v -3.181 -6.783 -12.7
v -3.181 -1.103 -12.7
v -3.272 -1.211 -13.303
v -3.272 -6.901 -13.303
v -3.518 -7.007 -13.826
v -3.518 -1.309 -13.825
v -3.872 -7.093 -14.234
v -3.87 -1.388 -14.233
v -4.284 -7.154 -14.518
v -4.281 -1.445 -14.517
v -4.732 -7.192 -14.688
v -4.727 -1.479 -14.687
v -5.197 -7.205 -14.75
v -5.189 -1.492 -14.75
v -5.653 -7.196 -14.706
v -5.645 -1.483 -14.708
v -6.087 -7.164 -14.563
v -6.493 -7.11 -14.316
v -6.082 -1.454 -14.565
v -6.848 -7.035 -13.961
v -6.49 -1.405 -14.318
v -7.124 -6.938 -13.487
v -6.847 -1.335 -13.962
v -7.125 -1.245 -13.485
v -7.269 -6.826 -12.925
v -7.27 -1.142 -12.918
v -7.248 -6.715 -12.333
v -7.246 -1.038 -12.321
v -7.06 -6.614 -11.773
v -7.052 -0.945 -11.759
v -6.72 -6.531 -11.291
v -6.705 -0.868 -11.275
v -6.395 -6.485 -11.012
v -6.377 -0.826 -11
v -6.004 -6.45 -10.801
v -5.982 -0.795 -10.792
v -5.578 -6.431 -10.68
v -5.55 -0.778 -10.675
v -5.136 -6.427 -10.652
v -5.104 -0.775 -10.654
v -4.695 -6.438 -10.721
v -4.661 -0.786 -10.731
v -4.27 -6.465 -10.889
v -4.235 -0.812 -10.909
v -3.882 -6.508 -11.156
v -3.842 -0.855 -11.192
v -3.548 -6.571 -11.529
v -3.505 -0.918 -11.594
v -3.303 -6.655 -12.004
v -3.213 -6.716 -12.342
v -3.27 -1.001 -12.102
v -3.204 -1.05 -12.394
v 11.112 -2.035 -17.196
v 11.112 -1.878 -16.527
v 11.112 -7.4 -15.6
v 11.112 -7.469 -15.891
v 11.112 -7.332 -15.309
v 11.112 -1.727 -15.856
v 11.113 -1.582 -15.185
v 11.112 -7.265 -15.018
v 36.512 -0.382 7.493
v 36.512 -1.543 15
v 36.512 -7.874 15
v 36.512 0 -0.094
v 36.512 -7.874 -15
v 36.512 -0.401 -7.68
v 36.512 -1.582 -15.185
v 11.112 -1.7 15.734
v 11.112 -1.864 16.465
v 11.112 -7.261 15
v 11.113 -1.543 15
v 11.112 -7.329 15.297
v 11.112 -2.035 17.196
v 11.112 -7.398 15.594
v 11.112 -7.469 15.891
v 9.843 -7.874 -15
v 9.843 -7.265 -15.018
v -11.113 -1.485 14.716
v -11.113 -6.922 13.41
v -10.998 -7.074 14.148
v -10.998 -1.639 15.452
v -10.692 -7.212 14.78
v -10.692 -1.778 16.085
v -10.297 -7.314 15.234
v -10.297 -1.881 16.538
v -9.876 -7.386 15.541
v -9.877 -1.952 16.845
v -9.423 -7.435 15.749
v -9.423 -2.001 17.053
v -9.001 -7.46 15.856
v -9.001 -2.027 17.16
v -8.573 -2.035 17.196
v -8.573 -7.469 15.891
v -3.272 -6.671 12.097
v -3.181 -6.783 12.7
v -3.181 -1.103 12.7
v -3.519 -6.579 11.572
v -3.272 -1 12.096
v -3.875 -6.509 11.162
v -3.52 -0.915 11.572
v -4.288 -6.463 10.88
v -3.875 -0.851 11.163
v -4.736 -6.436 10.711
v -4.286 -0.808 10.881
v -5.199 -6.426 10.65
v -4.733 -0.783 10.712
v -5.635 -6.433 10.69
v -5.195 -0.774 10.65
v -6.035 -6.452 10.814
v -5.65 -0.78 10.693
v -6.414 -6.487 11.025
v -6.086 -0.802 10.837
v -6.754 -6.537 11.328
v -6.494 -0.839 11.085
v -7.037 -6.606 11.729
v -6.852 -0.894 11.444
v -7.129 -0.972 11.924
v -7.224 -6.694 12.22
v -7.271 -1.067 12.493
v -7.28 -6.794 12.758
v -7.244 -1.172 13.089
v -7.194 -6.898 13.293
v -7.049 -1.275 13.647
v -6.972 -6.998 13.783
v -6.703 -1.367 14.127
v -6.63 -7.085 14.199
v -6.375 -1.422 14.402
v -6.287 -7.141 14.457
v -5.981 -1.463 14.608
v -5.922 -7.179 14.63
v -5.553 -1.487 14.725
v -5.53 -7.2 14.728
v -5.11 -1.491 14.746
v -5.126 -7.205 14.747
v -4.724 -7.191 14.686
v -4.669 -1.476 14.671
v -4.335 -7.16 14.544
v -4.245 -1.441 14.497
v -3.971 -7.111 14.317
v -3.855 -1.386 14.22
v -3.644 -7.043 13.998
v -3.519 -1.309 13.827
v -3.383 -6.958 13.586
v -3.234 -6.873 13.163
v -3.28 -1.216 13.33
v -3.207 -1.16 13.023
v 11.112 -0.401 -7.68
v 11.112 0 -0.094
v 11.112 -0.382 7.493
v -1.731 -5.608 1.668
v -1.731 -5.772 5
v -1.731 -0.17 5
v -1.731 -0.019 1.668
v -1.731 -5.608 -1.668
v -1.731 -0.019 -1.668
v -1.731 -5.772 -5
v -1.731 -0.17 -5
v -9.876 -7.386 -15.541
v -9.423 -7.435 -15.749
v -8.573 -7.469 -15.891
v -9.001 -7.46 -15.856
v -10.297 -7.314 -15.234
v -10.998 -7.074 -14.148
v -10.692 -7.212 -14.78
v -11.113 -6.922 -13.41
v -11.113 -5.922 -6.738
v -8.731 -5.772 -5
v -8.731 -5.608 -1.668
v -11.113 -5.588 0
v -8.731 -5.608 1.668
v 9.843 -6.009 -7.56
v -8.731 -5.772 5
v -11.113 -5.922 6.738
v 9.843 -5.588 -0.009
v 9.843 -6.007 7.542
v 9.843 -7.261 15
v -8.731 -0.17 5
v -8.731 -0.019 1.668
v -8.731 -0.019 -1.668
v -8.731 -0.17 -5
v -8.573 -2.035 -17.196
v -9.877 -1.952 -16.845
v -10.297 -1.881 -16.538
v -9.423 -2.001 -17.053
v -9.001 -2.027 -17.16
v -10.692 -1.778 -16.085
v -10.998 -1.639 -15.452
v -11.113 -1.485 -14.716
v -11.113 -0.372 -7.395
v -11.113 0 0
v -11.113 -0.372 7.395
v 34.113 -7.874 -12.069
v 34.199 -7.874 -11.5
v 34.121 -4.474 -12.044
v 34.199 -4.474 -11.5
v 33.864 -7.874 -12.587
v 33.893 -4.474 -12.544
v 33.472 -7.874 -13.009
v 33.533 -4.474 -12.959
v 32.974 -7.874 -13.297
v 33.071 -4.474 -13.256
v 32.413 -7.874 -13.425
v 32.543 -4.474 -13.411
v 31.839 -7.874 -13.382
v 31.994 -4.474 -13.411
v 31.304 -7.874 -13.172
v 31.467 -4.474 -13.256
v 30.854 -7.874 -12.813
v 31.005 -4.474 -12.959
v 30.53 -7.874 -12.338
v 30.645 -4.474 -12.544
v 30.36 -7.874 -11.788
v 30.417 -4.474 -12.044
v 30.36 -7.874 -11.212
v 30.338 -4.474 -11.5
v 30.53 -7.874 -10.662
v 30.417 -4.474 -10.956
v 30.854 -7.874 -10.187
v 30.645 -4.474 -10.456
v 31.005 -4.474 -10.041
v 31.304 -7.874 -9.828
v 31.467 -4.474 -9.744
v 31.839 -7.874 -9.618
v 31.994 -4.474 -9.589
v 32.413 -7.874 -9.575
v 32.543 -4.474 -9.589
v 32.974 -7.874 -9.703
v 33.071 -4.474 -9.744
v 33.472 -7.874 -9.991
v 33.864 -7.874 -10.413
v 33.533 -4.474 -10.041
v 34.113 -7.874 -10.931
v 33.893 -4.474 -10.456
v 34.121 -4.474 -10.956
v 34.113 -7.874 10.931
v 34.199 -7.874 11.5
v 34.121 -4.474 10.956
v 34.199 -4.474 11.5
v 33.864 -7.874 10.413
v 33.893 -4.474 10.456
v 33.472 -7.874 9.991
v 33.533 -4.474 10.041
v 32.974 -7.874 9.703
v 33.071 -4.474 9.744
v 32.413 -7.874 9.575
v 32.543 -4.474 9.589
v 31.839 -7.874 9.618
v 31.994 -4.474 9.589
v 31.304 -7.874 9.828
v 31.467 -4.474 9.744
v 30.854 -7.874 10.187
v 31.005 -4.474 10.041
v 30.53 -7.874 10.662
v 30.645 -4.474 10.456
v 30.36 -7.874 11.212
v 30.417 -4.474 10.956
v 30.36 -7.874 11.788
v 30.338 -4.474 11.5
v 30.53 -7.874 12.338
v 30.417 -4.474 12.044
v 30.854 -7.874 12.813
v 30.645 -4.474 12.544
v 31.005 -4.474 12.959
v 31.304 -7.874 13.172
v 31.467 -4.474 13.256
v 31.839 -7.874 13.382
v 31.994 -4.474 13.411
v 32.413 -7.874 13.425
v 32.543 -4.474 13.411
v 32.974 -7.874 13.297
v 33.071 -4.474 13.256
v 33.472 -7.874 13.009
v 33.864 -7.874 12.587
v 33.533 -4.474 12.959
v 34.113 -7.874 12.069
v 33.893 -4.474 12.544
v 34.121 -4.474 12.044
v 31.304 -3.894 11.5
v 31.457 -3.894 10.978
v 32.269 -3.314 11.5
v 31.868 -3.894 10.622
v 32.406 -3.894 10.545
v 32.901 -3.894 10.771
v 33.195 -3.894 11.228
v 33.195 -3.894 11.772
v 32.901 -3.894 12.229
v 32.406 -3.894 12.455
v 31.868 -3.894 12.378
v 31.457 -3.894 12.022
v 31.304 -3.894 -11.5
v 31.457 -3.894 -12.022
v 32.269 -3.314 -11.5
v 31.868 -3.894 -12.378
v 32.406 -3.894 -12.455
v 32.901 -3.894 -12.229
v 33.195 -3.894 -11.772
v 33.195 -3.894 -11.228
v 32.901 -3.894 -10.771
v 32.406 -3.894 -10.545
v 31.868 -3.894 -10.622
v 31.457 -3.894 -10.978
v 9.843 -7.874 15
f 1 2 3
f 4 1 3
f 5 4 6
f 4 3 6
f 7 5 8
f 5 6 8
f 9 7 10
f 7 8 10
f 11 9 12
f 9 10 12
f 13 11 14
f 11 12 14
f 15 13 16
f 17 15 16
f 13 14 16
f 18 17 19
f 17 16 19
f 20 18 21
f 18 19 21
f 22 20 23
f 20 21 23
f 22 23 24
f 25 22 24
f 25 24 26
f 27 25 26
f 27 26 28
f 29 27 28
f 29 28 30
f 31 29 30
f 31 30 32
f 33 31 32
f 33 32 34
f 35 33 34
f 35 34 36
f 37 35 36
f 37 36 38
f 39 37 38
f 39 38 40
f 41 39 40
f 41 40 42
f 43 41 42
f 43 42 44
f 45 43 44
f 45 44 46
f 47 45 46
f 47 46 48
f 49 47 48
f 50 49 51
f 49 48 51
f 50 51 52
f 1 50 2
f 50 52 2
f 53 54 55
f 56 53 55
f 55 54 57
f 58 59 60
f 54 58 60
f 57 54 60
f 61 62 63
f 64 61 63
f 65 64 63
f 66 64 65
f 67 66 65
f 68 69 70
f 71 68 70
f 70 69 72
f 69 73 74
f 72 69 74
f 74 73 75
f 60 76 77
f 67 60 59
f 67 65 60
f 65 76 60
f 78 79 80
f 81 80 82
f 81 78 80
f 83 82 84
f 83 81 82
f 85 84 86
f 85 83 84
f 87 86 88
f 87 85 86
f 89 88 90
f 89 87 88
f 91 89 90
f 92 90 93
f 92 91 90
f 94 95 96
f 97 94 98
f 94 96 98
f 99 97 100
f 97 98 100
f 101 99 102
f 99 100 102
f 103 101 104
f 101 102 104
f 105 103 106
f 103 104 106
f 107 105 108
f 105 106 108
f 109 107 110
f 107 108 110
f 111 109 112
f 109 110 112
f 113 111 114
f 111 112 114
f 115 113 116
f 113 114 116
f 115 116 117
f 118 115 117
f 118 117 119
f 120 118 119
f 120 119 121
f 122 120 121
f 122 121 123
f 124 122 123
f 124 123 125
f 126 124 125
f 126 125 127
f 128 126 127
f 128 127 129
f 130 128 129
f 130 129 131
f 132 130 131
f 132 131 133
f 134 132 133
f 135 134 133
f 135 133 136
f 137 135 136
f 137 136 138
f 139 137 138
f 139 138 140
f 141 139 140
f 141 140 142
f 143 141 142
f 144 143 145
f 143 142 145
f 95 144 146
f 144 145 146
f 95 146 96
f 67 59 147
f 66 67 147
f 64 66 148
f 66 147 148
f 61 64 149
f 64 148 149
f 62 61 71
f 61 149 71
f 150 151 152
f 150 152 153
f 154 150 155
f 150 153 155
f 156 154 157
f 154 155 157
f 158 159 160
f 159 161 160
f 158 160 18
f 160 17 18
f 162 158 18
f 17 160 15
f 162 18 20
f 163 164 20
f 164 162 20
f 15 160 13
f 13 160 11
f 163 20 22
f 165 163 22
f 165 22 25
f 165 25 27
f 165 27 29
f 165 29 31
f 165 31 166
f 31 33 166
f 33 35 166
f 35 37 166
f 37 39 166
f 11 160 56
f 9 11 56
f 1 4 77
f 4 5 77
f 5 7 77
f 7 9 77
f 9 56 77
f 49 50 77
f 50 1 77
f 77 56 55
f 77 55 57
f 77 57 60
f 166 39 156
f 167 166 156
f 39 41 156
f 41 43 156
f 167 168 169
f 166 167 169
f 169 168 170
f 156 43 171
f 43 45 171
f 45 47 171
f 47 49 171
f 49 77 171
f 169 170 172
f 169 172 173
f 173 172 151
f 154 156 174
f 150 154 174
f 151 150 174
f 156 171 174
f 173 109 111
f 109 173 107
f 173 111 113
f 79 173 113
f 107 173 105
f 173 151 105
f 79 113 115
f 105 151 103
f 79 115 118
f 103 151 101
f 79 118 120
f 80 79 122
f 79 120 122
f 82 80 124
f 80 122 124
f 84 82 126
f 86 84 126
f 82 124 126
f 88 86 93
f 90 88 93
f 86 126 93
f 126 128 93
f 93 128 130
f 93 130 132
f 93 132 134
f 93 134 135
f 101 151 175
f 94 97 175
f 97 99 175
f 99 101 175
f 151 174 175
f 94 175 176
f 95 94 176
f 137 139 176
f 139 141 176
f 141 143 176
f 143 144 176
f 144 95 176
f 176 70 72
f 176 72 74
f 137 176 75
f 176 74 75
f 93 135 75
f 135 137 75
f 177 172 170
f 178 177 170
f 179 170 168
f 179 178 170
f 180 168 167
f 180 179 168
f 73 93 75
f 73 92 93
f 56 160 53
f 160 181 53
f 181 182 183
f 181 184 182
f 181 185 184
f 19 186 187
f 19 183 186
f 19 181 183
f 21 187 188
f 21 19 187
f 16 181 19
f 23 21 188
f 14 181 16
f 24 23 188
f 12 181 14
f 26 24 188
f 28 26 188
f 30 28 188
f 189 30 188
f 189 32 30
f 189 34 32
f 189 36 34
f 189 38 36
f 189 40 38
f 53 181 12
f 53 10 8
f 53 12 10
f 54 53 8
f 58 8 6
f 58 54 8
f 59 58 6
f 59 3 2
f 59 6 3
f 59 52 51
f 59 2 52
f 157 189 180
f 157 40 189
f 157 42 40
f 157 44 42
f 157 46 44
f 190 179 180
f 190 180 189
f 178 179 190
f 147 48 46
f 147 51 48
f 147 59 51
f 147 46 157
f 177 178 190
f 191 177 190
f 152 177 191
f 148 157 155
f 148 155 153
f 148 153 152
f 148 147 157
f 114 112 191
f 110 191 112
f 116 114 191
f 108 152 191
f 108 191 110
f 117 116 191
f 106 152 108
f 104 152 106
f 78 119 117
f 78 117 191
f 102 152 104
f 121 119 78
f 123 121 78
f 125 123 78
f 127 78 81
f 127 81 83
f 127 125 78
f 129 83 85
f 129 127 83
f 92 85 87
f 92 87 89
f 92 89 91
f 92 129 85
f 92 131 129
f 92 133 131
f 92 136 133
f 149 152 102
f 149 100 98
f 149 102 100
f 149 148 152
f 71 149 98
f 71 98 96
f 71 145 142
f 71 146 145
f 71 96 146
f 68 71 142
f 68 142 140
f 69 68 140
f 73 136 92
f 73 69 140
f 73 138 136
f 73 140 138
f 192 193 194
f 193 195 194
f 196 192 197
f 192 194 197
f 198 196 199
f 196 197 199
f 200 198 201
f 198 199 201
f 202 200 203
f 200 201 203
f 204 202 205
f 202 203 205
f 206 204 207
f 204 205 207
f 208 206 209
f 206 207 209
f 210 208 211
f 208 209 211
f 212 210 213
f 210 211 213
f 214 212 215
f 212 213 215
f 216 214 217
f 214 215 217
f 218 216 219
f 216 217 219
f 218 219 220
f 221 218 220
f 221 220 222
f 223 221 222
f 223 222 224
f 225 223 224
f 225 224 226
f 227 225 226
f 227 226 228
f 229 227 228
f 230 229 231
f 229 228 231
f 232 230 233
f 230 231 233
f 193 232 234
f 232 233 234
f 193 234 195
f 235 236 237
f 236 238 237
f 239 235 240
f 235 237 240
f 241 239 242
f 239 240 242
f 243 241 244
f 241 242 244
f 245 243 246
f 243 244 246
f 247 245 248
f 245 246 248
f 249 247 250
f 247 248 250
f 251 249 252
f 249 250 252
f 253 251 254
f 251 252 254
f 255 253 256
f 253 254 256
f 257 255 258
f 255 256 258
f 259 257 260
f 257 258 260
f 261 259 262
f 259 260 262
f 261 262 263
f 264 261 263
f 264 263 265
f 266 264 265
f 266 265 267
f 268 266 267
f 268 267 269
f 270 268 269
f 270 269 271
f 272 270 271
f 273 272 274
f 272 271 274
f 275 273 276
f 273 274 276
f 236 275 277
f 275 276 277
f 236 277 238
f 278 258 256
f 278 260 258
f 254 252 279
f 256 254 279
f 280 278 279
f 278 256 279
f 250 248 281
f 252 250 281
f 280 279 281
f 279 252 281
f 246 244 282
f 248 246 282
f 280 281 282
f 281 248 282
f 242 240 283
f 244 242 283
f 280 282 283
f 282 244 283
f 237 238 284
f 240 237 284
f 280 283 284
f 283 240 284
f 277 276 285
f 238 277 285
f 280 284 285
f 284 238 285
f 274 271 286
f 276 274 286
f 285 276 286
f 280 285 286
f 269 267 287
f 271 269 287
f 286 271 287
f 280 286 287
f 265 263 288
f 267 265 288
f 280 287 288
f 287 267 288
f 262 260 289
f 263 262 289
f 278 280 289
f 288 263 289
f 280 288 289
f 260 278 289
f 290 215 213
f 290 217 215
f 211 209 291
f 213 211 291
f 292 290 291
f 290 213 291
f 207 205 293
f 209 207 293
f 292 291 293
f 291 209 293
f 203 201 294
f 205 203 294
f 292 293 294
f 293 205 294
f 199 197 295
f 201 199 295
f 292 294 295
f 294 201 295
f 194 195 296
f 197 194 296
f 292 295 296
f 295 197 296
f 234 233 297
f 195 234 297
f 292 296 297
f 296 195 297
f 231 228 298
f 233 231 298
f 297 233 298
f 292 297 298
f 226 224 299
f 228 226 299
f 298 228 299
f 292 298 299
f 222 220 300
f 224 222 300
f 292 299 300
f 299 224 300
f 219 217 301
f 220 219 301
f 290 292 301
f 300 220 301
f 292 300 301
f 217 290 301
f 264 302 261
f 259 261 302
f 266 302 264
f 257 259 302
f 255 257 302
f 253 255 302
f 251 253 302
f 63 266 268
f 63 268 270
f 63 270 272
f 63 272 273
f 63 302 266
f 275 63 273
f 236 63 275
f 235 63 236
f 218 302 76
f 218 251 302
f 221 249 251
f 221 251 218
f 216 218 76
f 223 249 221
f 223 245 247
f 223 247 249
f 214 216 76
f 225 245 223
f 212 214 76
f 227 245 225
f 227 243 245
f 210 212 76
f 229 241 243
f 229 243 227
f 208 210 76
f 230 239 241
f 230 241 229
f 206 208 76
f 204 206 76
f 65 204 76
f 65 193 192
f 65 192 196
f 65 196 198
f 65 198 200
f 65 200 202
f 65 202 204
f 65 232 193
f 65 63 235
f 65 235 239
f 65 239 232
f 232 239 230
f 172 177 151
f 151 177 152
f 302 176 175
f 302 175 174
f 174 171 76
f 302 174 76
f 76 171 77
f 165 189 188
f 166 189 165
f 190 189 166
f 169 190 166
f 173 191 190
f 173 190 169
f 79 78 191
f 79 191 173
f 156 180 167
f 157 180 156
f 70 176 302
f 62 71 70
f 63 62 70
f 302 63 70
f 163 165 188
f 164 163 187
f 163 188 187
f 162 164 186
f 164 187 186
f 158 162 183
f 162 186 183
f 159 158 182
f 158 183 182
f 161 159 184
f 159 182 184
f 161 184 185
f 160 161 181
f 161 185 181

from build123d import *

# Parameters (mm, degrees)
SKETCH1_W                       = 22.225
SKETCH1_H                       = 5.588
REVOLVE1_ANGLE                  = 27
SKETCH2_W                       = 6.99999997
SKETCH2_H                       = 10.000000066
SKETCH2_R                       = 2.049999964
CUT_EXTRUDE1_DEPTH              = 22.793561204
FILLET2_R                       = 2.54
BOSS_EXTRUDE2_DEPTH             = 25.4
BOSS_EXTRUDE2_DEPTH_BACK        = 1.27
F_24_0_152_DIAMETER_HOLE1_D     = 3.8608
F_24_0_152_DIAMETER_HOLE1_DEPTH = 3.3999932
F_24_0_152_DIAMETER_HOLE1_TIP   = 1.159901339


with BuildPart() as part:
    # Sketch1 → Revolve1 (revolve, symmetric)
    with BuildSketch(Plane.XY) as revolve1_sk:
        with Locations((0, -2.794)):
            Rectangle(SKETCH1_W, SKETCH1_H)
    revolve(axis=Axis((21.580970856, -73.66, 0), (-1, 0, 0)), revolution_arc=REVOLVE1_ANGLE / 2)
    revolve(revolve1_sk.sketch, axis=Axis((21.580970856, -73.66, 0), (1, 0, 0)), revolution_arc=REVOLVE1_ANGLE / 2)

    # Sketch2 → Cut-Extrude1 (cut, through all)
    with BuildSketch(Plane(origin=(0, 0, 0), x_dir=(1, 0, 0), z_dir=(0, 1, 0))):
        with Locations((-5.231250015, 0)):
            Rectangle(SKETCH2_W, SKETCH2_H)
        with Locations((-5.231250015, 12.7)):
            Circle(SKETCH2_R)
        with Locations((-5.231250015, -12.7)):
            Circle(SKETCH2_R)
    extrude(amount=-CUT_EXTRUDE1_DEPTH, mode=Mode.SUBTRACT)

    # Fillet2
    fillet2_edges = [part.edges().sort_by_distance(p)[0] for p in [
        (-11.1125, -4.752033221, -16.543339155),
        (-11.1125, -4.752033221, 16.543339155),
    ]]
    fillet(fillet2_edges, radius=FILLET2_R)

    # Sketch8 → Boss-Extrude2 (add, two sides: drawn at the far end of the back side and taken through both)
    with BuildSketch(Plane(origin=(11.1125, 0, 0), x_dir=(0, 0, -1), z_dir=(1, 0, 0)).offset(-BOSS_EXTRUDE2_DEPTH_BACK)):
        with BuildLine():
            Line((-15, -7.874), (15, -7.874))
            Line((15, -7.874), (15.184616566, -1.5821045))
            ThreePointArc((15.184616566, -1.5821045), (0.094309083, -6.0373e-05), (-15, -1.543458208))
            Line((-15, -1.543458208), (-15, -7.874))
        make_face()
    extrude(amount=BOSS_EXTRUDE2_DEPTH + BOSS_EXTRUDE2_DEPTH_BACK)

    # #24 (0.152) Diameter Hole1
    with Locations(Plane(origin=(0, -7.874, 0), x_dir=(-1, 0, 0), z_dir=(0, -1, 0))):
        with Locations((-32.26874997, 11.5), (-32.26874997, -11.5)):
            Hole(F_24_0_152_DIAMETER_HOLE1_D / 2, depth=F_24_0_152_DIAMETER_HOLE1_DEPTH)
            with Locations((0, 0, -(F_24_0_152_DIAMETER_HOLE1_DEPTH + F_24_0_152_DIAMETER_HOLE1_TIP / 2))):  # 118° drill point
                Cone(0, F_24_0_152_DIAMETER_HOLE1_D / 2, F_24_0_152_DIAMETER_HOLE1_TIP, mode=Mode.SUBTRACT)


solid = part.part
